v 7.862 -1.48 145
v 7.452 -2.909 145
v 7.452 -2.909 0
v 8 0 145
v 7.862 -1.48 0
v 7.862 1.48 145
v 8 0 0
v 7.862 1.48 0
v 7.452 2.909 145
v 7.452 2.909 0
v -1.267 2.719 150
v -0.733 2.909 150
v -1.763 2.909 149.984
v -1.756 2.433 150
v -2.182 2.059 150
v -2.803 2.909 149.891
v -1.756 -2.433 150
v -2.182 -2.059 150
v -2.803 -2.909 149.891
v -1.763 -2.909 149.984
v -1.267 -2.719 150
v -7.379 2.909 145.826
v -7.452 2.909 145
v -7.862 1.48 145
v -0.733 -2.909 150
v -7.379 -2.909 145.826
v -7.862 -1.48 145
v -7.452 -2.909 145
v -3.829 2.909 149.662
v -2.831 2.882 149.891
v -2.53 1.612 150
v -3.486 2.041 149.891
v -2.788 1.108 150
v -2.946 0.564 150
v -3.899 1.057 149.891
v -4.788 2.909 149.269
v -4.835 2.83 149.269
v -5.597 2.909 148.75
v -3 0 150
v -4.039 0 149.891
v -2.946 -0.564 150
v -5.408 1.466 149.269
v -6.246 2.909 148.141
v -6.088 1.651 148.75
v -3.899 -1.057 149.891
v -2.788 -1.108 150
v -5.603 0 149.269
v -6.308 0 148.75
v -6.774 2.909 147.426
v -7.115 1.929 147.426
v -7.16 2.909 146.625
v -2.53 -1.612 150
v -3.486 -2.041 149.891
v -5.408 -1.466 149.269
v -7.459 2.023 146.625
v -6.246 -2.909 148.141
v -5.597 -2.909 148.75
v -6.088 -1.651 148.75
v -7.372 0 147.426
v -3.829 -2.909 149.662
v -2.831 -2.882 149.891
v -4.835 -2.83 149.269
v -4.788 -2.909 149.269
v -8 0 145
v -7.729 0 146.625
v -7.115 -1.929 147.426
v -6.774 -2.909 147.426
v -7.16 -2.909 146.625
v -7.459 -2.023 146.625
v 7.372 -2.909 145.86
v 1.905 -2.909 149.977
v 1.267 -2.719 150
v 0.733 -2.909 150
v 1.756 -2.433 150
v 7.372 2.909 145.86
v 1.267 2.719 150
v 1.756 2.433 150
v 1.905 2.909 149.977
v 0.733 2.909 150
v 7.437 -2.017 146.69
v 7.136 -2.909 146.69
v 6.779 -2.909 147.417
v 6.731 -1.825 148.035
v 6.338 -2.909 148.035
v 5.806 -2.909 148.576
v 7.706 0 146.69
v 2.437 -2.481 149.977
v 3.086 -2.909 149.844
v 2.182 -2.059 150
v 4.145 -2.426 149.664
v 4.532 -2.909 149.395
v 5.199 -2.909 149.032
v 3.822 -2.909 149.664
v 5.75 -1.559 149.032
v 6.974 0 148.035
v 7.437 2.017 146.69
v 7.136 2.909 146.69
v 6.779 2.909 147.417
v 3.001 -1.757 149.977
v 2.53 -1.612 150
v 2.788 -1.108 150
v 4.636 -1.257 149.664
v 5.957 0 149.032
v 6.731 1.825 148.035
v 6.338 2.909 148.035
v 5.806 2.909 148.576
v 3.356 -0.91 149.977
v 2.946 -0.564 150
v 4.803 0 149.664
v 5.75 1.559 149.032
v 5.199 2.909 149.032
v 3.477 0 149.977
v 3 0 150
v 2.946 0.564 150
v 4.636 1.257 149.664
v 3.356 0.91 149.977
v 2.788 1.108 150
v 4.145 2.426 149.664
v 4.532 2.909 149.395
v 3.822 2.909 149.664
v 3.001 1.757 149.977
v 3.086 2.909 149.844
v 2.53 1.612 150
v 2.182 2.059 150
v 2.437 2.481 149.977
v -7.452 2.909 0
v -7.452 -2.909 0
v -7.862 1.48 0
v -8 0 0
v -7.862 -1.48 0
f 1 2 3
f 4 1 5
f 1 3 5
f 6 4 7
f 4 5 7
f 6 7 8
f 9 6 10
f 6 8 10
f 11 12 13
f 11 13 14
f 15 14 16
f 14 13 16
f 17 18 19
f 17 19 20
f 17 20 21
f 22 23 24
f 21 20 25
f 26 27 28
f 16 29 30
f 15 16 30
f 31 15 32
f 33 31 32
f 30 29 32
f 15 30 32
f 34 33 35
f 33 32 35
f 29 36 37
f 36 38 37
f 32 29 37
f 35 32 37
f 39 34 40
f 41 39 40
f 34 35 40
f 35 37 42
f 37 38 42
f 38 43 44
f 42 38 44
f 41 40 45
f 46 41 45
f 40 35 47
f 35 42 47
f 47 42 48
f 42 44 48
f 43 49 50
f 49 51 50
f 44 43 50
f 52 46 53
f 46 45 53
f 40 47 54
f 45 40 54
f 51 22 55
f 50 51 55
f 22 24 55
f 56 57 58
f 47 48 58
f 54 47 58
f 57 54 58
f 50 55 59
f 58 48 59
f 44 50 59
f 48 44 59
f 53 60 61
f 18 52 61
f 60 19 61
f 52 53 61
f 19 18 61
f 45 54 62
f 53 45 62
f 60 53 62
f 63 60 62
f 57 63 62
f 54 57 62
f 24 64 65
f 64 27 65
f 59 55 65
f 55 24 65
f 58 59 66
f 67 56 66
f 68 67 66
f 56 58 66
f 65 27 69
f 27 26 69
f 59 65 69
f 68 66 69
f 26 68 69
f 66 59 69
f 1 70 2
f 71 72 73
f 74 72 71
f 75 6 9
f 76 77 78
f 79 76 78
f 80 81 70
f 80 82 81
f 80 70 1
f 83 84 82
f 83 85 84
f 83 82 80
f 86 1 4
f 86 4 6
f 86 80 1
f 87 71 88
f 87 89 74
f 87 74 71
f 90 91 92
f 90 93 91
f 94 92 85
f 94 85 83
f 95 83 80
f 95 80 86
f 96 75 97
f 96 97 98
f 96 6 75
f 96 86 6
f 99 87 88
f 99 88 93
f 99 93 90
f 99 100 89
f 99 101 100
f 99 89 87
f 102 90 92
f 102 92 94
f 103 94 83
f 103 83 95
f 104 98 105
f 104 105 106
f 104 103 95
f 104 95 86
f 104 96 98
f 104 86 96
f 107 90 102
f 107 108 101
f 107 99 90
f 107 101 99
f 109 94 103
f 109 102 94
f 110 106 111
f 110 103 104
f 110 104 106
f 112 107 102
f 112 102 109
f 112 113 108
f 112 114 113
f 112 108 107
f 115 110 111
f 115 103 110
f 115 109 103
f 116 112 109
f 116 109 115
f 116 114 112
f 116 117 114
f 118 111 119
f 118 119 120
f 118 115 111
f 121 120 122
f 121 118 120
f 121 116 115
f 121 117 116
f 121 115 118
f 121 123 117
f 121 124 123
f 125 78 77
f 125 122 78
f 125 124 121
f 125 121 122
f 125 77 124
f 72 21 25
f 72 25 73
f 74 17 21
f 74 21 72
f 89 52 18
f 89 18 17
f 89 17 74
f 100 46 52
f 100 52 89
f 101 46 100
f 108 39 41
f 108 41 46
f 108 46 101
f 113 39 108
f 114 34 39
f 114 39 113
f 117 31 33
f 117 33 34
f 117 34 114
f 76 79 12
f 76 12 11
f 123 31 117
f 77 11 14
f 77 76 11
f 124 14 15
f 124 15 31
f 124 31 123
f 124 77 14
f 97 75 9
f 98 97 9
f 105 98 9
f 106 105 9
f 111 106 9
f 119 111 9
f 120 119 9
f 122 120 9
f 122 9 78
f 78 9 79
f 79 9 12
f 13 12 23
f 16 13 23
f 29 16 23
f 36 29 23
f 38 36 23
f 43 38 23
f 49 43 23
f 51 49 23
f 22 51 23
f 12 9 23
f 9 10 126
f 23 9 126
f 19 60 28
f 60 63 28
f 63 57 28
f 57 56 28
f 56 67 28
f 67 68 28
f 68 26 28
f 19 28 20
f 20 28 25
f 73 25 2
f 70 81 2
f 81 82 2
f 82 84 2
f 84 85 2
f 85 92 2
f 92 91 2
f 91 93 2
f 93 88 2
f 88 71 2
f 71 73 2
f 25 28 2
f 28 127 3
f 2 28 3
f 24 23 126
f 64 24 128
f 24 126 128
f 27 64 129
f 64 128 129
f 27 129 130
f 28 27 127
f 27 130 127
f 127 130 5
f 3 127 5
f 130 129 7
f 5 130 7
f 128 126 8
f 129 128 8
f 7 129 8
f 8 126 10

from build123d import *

# Parameters (mm, degrees)
F1_DEPTH = 150
F2_R     = 5
F3_R     = 5


# Not quite as in the source:
# - a feature names something its author has since deleted; it is built from what else it names


with BuildPart() as f1:
    # F0 (on Top) → F1 (new body)
    with BuildSketch(Plane.XY):
        with BuildLine():
            Line((7.4523278298, 2.9090909091), (-7.4523278298, 2.9090909091))
            ThreePointArc((-7.4523278298, 2.9090909091), (-8, 0), (-7.4523278298, -2.9090909091))
            Line((-7.4523278298, -2.9090909091), (7.4523278298, -2.9090909091))
            ThreePointArc((7.4523278298, -2.9090909091), (8, 0), (7.4523278298, 2.9090909091))
        make_face()
    extrude(amount=F1_DEPTH)

    # F2
    f2_edges = [f1.edges().sort_by_distance(p)[0] for p in [
        (8, 0, 150),
    ]]
    fillet(f2_edges, radius=F2_R)

    # F3
    f3_edges = [f1.edges().sort_by_distance(p)[0] for p in [
        (-8, 0, 150),
    ]]
    fillet(f3_edges, radius=F3_R)


solid = f1.part
